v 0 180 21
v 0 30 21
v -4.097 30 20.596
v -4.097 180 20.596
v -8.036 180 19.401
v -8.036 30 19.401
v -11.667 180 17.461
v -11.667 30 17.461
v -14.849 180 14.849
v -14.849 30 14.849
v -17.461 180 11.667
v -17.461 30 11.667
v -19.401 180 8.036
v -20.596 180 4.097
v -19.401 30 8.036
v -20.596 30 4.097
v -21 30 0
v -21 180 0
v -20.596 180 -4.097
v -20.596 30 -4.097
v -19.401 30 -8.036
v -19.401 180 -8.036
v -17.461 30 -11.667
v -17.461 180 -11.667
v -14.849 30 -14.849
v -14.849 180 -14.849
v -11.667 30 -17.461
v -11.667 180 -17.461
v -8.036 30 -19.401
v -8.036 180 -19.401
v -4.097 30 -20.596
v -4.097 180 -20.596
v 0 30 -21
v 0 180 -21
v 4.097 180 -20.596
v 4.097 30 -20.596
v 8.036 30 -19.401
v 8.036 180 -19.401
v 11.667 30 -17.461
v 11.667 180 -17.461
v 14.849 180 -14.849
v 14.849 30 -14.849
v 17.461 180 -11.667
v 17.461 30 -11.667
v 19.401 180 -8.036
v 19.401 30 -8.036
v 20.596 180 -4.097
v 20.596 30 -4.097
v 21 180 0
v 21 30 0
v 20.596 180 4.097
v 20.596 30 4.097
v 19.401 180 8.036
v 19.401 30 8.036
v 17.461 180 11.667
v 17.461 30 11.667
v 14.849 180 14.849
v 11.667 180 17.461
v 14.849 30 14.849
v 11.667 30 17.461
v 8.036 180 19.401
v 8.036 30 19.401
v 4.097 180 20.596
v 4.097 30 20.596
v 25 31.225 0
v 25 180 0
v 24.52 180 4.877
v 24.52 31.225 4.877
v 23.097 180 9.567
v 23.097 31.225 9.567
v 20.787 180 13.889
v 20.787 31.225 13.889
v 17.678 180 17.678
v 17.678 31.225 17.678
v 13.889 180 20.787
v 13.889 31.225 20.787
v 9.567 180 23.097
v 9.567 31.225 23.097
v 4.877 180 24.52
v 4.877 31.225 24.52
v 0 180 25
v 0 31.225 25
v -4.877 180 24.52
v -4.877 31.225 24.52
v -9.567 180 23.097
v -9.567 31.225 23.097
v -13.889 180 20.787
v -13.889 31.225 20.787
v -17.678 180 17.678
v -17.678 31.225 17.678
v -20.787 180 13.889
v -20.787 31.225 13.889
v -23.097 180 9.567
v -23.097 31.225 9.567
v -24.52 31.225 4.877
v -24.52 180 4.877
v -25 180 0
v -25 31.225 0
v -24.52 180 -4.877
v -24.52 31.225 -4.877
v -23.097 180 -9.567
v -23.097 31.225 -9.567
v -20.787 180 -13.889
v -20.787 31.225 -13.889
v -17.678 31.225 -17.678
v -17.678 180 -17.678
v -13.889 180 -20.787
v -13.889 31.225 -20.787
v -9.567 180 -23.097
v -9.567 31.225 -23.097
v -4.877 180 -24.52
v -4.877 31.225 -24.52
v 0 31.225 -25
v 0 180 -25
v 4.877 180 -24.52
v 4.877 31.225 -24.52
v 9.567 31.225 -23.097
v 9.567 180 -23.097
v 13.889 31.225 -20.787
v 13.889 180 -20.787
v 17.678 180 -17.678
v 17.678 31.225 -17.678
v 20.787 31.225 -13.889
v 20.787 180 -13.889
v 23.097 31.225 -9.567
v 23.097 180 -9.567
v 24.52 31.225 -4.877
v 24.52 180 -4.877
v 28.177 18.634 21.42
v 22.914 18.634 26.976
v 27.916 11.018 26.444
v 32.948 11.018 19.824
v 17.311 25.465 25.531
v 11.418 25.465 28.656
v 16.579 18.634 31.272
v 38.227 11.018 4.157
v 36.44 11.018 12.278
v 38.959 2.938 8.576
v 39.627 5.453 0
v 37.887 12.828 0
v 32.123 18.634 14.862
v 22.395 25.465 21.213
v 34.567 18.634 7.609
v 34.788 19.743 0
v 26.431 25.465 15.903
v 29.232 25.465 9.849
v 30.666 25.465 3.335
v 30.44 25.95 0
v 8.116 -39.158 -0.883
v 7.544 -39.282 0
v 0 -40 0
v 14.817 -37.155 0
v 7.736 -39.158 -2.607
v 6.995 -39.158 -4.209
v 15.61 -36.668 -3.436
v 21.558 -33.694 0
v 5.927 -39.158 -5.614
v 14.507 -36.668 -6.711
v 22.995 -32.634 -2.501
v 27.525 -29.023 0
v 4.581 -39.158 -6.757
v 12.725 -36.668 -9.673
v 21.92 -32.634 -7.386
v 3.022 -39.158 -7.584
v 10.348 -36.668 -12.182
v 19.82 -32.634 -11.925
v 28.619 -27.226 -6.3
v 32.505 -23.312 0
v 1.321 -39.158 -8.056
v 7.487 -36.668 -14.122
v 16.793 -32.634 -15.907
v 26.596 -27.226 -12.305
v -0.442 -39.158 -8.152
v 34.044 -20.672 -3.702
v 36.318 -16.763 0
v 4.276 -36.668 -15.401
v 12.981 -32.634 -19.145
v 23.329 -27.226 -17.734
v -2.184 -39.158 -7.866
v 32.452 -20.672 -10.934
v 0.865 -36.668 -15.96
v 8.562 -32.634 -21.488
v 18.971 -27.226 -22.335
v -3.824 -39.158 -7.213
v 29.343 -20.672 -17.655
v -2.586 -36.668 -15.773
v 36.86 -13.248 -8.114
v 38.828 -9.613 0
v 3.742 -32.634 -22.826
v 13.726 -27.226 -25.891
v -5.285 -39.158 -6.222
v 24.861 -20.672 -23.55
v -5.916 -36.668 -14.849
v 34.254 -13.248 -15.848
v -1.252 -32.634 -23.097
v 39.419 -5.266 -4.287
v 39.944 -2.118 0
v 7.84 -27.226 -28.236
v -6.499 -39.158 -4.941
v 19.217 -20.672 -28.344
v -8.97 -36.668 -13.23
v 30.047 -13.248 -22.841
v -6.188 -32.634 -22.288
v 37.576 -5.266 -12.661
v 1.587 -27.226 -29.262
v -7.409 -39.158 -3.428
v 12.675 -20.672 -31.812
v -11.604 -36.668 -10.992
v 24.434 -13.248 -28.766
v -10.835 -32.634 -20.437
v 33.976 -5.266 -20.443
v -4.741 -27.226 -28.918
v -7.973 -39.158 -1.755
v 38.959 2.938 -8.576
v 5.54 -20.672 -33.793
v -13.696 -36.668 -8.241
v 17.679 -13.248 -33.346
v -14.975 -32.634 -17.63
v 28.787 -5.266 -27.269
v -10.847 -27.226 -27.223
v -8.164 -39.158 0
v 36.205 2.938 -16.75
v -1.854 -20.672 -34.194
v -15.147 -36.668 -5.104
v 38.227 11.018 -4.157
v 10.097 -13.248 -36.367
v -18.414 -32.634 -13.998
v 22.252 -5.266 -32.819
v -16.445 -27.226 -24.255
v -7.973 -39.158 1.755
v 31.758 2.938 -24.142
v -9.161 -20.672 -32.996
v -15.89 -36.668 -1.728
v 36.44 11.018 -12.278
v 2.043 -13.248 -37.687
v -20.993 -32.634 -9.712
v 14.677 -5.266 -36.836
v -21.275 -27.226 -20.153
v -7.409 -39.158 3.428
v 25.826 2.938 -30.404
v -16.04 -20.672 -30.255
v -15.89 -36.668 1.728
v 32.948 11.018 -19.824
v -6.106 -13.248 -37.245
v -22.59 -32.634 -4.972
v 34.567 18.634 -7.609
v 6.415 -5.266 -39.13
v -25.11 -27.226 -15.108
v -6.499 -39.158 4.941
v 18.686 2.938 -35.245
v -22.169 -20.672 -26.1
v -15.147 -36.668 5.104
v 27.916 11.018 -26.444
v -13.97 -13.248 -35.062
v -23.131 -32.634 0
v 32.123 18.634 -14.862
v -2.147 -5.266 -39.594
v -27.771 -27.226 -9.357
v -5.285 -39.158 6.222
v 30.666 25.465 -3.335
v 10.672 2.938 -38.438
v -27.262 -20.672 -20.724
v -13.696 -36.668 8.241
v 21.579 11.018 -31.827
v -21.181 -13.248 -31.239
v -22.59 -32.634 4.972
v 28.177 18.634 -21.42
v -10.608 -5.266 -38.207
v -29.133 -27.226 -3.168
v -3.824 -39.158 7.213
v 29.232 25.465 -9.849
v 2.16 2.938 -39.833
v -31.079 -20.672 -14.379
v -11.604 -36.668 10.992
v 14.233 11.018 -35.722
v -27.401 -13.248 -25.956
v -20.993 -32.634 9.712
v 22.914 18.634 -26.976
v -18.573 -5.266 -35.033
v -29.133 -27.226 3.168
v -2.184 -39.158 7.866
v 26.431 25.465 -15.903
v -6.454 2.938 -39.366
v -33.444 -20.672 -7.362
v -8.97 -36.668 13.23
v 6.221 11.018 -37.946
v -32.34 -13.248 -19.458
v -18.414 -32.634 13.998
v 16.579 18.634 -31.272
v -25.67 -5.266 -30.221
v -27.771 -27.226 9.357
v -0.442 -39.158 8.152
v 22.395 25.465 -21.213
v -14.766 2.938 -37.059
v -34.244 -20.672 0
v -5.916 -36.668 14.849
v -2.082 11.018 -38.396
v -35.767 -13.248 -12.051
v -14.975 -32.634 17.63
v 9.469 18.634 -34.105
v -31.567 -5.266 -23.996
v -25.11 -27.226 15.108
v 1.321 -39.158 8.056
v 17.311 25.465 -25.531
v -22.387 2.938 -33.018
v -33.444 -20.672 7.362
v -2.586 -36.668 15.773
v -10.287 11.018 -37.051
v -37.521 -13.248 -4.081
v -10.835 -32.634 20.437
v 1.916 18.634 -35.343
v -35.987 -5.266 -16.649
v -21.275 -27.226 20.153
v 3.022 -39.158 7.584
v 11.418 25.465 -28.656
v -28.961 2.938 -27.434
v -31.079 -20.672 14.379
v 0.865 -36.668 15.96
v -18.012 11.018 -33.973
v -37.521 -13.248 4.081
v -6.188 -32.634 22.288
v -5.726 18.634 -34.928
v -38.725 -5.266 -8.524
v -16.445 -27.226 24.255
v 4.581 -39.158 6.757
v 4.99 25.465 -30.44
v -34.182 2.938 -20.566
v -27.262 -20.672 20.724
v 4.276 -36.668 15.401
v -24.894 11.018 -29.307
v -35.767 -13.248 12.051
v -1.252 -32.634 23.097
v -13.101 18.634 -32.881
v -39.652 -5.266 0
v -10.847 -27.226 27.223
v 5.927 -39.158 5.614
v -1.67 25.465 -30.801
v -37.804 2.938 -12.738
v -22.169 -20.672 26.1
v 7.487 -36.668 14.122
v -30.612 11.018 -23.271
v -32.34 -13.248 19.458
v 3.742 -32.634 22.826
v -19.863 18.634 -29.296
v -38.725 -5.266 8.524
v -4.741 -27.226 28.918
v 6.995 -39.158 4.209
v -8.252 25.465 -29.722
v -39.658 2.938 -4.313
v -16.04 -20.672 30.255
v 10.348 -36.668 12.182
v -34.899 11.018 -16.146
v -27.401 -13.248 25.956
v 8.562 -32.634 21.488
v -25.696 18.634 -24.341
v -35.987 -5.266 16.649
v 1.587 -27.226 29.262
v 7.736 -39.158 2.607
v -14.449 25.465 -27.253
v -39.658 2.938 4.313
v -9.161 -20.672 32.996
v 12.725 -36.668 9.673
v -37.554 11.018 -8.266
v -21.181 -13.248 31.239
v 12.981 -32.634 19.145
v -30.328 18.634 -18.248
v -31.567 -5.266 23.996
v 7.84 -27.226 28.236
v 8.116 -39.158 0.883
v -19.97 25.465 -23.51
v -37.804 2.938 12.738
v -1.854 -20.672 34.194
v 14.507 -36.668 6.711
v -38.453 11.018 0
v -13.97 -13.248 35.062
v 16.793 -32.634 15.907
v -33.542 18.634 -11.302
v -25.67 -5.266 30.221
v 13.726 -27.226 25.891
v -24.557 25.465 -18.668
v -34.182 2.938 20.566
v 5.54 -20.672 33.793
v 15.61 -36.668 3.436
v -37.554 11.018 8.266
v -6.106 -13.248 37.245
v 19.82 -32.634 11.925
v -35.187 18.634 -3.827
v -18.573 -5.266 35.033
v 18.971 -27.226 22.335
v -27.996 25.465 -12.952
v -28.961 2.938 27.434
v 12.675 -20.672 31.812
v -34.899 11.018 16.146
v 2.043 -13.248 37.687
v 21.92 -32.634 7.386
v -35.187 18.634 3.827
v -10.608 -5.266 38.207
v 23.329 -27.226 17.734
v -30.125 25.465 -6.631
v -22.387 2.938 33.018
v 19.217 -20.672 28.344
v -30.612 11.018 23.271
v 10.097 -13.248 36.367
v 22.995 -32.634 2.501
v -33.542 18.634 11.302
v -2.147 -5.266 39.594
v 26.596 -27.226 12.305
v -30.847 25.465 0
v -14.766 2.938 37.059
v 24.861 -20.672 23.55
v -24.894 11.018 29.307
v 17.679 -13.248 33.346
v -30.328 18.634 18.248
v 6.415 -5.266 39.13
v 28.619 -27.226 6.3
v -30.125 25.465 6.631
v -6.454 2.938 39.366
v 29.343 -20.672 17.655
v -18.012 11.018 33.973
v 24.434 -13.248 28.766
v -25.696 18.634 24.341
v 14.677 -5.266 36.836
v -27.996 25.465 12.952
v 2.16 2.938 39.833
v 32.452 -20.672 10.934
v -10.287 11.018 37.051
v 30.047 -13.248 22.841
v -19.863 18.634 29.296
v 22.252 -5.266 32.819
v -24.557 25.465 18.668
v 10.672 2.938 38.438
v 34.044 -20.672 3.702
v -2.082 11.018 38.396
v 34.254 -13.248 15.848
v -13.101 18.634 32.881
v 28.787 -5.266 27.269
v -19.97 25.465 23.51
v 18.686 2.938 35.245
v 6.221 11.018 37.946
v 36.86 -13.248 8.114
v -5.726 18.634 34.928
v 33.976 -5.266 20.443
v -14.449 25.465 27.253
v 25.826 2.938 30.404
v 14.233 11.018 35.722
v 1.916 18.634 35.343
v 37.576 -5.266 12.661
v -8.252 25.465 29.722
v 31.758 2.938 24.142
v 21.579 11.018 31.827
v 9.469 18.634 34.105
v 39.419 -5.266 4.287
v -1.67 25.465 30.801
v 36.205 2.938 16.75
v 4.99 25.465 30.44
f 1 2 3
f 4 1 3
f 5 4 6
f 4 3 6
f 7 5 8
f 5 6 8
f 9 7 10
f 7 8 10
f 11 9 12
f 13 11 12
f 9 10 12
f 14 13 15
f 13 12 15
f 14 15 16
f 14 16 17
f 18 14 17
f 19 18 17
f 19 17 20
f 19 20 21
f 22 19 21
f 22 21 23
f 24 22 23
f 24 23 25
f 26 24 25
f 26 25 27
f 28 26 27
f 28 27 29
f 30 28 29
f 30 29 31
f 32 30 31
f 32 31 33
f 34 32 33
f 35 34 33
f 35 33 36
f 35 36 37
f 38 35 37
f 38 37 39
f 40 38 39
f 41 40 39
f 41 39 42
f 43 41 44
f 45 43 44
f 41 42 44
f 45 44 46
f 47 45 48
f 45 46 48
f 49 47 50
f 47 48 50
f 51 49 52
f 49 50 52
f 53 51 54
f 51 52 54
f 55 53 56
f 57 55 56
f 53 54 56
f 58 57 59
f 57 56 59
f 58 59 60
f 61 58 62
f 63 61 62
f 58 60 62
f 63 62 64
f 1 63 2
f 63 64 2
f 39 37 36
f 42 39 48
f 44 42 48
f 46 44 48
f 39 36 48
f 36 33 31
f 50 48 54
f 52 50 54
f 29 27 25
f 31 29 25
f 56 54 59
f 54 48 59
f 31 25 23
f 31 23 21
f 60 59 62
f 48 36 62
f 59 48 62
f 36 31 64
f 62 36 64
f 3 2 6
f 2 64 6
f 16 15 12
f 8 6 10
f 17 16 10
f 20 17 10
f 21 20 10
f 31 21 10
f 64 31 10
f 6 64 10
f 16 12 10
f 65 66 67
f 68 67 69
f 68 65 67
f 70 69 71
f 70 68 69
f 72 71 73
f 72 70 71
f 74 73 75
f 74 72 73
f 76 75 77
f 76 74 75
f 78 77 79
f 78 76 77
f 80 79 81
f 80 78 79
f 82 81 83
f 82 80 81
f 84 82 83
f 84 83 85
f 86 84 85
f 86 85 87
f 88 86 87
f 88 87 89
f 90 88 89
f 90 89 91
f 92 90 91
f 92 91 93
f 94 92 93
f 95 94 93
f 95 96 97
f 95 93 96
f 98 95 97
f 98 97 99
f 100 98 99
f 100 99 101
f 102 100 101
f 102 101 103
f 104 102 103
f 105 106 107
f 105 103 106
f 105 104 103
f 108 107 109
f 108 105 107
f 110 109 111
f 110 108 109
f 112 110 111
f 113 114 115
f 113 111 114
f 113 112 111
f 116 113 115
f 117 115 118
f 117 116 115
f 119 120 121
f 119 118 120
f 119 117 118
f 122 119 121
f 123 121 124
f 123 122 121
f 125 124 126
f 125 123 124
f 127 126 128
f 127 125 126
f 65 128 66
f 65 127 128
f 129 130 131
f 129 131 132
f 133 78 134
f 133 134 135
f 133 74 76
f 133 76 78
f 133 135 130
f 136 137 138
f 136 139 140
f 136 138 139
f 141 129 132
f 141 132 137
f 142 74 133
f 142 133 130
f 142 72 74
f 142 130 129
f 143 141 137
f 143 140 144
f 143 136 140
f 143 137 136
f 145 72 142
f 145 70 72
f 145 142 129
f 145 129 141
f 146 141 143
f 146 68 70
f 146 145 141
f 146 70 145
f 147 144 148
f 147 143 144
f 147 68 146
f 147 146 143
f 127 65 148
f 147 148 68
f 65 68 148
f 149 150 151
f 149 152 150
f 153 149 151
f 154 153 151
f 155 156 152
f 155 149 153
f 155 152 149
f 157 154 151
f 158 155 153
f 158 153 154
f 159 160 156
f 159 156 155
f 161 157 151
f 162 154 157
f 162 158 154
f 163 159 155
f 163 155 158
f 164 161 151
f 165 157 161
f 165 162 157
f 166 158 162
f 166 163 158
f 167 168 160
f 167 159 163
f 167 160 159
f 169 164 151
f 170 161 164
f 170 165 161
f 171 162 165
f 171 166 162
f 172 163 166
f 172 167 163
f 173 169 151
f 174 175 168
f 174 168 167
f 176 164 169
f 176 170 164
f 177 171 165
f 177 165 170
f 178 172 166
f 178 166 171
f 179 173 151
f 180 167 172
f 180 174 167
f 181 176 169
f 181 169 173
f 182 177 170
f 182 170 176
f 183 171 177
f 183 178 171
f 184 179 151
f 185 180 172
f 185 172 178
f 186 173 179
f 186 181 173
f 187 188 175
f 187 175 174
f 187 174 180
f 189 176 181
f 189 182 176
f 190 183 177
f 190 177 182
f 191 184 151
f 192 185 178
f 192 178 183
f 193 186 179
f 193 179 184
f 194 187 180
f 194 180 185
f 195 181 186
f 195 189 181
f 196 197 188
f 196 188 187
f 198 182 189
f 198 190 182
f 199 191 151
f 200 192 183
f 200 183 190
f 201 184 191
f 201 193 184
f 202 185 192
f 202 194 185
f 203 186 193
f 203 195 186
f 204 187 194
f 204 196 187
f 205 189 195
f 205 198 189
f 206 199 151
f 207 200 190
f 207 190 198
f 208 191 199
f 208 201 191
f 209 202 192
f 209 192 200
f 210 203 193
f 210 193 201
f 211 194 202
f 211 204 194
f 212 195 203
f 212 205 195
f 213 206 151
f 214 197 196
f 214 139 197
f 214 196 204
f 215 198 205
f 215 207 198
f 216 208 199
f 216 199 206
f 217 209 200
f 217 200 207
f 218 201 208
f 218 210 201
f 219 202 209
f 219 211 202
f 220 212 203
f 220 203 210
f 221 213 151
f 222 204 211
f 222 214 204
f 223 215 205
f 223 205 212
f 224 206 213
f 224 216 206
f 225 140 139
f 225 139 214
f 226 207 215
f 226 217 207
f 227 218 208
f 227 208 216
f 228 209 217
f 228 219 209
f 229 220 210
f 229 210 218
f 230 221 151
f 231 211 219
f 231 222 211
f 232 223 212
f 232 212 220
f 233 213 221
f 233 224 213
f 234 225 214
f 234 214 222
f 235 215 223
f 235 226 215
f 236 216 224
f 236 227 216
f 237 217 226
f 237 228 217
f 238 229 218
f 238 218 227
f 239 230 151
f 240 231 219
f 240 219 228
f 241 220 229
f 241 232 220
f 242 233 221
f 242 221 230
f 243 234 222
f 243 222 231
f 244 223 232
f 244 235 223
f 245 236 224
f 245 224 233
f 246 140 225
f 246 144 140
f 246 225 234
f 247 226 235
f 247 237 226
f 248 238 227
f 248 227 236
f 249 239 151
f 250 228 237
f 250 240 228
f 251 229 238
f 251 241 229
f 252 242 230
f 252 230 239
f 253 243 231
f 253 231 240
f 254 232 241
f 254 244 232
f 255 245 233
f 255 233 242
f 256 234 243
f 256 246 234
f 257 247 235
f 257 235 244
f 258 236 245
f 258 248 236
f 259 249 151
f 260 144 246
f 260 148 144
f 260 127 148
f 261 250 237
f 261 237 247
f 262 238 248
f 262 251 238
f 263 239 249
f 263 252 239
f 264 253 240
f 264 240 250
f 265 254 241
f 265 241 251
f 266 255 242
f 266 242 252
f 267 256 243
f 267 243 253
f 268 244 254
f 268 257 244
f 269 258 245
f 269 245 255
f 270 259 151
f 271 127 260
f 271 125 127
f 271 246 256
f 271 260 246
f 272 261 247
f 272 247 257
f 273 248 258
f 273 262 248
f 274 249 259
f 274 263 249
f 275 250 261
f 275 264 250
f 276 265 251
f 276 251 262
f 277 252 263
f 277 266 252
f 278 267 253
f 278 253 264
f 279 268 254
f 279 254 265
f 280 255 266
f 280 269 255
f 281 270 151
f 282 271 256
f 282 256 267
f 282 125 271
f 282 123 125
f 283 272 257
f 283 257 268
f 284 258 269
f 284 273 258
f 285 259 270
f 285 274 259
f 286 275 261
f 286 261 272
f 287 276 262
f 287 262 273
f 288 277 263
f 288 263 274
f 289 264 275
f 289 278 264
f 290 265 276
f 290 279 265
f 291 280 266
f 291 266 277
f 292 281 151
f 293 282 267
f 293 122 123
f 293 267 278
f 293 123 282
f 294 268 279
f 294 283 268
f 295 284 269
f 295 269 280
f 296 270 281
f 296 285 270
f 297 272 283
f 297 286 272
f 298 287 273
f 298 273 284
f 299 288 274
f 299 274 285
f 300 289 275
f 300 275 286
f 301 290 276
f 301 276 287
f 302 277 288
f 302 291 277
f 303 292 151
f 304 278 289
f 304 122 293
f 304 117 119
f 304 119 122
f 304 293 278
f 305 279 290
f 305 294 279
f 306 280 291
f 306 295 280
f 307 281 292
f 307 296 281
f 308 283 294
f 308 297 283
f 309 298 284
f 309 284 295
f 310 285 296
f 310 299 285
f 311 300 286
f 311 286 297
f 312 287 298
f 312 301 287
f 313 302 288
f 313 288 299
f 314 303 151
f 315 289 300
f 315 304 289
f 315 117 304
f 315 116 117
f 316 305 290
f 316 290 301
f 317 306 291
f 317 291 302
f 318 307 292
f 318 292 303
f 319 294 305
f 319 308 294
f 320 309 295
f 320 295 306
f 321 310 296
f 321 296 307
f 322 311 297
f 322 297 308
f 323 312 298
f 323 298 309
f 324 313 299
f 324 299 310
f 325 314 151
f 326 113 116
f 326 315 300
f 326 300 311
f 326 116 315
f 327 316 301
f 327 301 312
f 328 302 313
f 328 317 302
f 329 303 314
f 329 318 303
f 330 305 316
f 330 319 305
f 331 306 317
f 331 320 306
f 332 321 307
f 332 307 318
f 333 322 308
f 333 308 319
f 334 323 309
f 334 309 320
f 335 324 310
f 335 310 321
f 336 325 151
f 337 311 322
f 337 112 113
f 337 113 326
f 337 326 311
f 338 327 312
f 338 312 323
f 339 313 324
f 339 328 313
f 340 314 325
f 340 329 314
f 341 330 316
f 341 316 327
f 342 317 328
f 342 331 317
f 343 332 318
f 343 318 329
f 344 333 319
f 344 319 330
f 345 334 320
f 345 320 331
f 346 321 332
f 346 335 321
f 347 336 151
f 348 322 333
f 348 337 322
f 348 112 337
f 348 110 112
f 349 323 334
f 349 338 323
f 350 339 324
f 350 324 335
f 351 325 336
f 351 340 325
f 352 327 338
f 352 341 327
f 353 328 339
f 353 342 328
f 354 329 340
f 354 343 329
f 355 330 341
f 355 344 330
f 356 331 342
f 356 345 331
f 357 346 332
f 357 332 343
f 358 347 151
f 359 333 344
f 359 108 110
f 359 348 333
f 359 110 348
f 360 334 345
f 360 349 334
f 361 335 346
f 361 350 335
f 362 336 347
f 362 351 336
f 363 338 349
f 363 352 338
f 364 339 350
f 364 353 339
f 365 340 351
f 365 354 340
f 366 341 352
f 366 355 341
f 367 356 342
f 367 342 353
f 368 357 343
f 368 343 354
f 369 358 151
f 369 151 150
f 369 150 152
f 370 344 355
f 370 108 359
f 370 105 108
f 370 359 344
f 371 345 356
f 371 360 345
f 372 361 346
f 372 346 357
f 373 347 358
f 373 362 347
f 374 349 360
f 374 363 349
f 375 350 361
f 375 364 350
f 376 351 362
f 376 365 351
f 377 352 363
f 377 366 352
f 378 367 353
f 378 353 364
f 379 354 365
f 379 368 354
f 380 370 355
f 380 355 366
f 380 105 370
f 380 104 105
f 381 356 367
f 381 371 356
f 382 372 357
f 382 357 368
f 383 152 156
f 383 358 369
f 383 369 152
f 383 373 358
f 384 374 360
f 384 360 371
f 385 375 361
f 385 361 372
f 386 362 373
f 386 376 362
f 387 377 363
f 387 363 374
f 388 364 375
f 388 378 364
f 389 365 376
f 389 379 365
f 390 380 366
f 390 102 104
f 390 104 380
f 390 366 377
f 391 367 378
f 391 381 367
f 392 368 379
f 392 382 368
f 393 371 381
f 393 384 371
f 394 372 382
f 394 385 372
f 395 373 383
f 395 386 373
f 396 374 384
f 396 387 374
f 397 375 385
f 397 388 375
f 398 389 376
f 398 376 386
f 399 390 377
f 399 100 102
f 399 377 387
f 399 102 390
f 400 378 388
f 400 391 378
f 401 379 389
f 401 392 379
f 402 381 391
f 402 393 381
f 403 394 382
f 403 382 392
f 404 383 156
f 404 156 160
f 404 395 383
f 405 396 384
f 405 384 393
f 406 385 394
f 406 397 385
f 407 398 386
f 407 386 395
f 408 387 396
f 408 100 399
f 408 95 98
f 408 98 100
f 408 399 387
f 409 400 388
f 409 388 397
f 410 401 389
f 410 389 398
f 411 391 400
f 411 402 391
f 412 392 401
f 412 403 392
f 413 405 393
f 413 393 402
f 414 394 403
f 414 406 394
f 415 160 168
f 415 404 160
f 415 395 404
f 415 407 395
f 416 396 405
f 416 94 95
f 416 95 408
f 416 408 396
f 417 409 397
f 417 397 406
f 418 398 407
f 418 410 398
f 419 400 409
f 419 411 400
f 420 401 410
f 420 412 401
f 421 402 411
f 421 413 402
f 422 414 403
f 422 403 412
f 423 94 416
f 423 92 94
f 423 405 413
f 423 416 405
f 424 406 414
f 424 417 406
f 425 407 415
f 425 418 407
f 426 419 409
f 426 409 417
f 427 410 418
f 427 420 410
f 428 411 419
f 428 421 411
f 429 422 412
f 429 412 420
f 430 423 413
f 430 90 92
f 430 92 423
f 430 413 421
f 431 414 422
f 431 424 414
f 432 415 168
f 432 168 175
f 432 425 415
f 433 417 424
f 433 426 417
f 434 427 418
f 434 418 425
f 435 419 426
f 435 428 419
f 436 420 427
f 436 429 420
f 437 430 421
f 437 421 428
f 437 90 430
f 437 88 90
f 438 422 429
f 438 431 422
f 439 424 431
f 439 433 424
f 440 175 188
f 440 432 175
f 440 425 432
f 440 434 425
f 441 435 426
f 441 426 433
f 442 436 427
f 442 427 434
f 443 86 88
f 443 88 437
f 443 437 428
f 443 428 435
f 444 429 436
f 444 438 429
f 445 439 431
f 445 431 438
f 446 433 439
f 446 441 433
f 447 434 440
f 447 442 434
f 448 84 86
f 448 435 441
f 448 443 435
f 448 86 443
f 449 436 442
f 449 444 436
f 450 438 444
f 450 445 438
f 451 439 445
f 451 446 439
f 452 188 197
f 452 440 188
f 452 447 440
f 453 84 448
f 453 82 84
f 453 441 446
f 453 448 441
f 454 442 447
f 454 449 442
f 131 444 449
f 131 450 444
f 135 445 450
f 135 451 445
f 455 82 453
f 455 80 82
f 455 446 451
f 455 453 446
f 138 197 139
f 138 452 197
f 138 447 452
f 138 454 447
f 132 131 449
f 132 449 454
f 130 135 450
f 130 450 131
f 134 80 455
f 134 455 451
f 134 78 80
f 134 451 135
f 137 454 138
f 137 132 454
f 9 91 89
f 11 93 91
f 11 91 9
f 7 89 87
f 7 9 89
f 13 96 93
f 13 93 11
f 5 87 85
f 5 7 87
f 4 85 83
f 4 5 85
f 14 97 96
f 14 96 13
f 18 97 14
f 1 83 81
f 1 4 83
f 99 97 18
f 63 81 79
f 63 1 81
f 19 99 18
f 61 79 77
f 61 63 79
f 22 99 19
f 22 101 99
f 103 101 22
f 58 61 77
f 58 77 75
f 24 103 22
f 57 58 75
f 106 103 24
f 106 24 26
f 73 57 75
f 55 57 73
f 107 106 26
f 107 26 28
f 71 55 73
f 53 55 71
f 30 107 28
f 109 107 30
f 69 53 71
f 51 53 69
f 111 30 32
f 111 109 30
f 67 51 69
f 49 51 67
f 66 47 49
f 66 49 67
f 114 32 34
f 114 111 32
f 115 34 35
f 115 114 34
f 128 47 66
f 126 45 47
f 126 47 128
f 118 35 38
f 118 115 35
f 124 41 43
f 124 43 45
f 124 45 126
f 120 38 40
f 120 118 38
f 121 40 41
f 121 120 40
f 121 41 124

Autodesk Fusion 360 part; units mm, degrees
sphere "SpherePrimitive1" add diameter 80 placed x (1, 0, 0) y (0, 0, -1) z (0, 1, 0) at (0, 0, 0)
sketch "Sketch2" plane through (0, 0, 0) normal (0, 1, 0) x (1, 0, 0)
  circle A0 centre (0, 0) radius 25
  dimension "d2" = 50
extrude "Extrude1" add sketch "Sketch2" along normal blind 200
hole "Hole1" at (0, 200, 0) direction (0, -1, 0) diameter 42 depth 170 tip angle 180
extrude "Extrude2" cut 1 faces at (23.554, 200, 1.7651) along direction (0, -1, 0) blind 20
